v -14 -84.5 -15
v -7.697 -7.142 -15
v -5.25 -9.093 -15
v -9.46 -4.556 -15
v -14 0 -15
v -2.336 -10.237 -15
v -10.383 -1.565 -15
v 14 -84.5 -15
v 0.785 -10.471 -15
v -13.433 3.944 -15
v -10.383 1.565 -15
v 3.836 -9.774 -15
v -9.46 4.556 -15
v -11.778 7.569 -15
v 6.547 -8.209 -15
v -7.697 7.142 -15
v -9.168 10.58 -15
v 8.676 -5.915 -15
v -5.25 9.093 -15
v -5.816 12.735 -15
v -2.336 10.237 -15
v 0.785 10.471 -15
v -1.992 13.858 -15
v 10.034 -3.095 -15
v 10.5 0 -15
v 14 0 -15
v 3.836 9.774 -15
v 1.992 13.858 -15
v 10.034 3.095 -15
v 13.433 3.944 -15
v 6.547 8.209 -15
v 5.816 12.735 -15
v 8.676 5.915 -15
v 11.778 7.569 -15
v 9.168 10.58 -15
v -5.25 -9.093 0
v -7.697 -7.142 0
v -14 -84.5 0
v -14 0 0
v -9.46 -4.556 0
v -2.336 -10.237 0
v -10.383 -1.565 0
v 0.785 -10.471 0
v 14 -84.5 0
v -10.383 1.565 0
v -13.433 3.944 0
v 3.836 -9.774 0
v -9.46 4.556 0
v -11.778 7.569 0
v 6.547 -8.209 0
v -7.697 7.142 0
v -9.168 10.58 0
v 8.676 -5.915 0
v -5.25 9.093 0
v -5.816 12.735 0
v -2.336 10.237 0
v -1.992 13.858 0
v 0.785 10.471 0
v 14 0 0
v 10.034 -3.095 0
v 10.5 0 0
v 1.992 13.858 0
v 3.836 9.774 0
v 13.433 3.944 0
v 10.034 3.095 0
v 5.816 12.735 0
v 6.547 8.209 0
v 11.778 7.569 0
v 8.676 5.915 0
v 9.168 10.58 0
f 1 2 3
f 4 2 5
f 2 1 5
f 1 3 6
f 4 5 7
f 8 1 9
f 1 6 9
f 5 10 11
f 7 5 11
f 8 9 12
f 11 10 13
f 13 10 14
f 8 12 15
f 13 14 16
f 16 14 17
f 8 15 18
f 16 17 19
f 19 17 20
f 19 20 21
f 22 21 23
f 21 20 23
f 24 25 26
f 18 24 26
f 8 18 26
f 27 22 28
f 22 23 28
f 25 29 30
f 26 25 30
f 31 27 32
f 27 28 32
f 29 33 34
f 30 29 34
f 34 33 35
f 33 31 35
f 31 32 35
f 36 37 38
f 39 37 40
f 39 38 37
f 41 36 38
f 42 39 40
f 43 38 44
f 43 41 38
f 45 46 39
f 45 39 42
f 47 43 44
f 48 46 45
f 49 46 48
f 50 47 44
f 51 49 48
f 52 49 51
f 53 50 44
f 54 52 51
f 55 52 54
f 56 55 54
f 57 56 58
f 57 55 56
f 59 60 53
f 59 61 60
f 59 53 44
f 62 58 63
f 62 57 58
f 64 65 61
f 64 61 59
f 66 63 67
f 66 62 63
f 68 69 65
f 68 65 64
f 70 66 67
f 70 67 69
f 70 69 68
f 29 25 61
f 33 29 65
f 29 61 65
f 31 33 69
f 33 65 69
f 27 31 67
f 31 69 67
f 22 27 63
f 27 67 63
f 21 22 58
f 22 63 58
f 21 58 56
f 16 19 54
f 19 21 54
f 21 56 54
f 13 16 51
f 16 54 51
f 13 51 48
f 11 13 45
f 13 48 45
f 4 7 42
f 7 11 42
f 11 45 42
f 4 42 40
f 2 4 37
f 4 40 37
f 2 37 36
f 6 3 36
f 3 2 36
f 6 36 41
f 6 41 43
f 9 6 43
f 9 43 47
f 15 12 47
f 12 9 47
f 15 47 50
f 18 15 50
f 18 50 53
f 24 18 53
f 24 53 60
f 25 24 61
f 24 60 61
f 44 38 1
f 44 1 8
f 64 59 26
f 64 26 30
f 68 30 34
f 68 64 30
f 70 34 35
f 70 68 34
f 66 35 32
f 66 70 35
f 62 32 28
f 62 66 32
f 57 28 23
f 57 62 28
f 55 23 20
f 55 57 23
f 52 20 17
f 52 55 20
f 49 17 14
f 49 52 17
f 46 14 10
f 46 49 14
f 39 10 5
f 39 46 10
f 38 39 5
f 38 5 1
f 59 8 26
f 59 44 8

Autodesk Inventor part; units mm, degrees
ref_plane "YZ Plane" through (0, 0, 0) normal (1, 0, 0) x (0, 1, 0)
ref_plane "XZ Plane" through (0, 0, 0) normal (0, 1, 0) x (-1, 0, 0)
ref_plane "XY Plane" through (0, 0, 0) normal (0, 0, 1) x (1, 0, 0)
sketch "Sketch1" plane through (0, 0, 0) normal (0, 0, 1) x (1, 0, 0)
  circle A0 centre (0, 0) radius 14
  circle A1 centre (0, 0) radius 10.5
  line L0 (14, 0) -> (-14, 0)
  line L1 (-14, 0) -> (-14, -84.5)
  line L2 (-14, -84.5) -> (14, -84.5)
  line L3 (14, -84.5) -> (14, 0)
  dimension "d0" = 28
  dimension "d1" = 21
  dimension "d2" = 84.5
extrude "Extrusion1" add sketch "Sketch1" against normal blind 15 contours L0 A1 A0 | L3 L2 L1 A0 | A0 L0 A1
properties part number "HandSupport"
